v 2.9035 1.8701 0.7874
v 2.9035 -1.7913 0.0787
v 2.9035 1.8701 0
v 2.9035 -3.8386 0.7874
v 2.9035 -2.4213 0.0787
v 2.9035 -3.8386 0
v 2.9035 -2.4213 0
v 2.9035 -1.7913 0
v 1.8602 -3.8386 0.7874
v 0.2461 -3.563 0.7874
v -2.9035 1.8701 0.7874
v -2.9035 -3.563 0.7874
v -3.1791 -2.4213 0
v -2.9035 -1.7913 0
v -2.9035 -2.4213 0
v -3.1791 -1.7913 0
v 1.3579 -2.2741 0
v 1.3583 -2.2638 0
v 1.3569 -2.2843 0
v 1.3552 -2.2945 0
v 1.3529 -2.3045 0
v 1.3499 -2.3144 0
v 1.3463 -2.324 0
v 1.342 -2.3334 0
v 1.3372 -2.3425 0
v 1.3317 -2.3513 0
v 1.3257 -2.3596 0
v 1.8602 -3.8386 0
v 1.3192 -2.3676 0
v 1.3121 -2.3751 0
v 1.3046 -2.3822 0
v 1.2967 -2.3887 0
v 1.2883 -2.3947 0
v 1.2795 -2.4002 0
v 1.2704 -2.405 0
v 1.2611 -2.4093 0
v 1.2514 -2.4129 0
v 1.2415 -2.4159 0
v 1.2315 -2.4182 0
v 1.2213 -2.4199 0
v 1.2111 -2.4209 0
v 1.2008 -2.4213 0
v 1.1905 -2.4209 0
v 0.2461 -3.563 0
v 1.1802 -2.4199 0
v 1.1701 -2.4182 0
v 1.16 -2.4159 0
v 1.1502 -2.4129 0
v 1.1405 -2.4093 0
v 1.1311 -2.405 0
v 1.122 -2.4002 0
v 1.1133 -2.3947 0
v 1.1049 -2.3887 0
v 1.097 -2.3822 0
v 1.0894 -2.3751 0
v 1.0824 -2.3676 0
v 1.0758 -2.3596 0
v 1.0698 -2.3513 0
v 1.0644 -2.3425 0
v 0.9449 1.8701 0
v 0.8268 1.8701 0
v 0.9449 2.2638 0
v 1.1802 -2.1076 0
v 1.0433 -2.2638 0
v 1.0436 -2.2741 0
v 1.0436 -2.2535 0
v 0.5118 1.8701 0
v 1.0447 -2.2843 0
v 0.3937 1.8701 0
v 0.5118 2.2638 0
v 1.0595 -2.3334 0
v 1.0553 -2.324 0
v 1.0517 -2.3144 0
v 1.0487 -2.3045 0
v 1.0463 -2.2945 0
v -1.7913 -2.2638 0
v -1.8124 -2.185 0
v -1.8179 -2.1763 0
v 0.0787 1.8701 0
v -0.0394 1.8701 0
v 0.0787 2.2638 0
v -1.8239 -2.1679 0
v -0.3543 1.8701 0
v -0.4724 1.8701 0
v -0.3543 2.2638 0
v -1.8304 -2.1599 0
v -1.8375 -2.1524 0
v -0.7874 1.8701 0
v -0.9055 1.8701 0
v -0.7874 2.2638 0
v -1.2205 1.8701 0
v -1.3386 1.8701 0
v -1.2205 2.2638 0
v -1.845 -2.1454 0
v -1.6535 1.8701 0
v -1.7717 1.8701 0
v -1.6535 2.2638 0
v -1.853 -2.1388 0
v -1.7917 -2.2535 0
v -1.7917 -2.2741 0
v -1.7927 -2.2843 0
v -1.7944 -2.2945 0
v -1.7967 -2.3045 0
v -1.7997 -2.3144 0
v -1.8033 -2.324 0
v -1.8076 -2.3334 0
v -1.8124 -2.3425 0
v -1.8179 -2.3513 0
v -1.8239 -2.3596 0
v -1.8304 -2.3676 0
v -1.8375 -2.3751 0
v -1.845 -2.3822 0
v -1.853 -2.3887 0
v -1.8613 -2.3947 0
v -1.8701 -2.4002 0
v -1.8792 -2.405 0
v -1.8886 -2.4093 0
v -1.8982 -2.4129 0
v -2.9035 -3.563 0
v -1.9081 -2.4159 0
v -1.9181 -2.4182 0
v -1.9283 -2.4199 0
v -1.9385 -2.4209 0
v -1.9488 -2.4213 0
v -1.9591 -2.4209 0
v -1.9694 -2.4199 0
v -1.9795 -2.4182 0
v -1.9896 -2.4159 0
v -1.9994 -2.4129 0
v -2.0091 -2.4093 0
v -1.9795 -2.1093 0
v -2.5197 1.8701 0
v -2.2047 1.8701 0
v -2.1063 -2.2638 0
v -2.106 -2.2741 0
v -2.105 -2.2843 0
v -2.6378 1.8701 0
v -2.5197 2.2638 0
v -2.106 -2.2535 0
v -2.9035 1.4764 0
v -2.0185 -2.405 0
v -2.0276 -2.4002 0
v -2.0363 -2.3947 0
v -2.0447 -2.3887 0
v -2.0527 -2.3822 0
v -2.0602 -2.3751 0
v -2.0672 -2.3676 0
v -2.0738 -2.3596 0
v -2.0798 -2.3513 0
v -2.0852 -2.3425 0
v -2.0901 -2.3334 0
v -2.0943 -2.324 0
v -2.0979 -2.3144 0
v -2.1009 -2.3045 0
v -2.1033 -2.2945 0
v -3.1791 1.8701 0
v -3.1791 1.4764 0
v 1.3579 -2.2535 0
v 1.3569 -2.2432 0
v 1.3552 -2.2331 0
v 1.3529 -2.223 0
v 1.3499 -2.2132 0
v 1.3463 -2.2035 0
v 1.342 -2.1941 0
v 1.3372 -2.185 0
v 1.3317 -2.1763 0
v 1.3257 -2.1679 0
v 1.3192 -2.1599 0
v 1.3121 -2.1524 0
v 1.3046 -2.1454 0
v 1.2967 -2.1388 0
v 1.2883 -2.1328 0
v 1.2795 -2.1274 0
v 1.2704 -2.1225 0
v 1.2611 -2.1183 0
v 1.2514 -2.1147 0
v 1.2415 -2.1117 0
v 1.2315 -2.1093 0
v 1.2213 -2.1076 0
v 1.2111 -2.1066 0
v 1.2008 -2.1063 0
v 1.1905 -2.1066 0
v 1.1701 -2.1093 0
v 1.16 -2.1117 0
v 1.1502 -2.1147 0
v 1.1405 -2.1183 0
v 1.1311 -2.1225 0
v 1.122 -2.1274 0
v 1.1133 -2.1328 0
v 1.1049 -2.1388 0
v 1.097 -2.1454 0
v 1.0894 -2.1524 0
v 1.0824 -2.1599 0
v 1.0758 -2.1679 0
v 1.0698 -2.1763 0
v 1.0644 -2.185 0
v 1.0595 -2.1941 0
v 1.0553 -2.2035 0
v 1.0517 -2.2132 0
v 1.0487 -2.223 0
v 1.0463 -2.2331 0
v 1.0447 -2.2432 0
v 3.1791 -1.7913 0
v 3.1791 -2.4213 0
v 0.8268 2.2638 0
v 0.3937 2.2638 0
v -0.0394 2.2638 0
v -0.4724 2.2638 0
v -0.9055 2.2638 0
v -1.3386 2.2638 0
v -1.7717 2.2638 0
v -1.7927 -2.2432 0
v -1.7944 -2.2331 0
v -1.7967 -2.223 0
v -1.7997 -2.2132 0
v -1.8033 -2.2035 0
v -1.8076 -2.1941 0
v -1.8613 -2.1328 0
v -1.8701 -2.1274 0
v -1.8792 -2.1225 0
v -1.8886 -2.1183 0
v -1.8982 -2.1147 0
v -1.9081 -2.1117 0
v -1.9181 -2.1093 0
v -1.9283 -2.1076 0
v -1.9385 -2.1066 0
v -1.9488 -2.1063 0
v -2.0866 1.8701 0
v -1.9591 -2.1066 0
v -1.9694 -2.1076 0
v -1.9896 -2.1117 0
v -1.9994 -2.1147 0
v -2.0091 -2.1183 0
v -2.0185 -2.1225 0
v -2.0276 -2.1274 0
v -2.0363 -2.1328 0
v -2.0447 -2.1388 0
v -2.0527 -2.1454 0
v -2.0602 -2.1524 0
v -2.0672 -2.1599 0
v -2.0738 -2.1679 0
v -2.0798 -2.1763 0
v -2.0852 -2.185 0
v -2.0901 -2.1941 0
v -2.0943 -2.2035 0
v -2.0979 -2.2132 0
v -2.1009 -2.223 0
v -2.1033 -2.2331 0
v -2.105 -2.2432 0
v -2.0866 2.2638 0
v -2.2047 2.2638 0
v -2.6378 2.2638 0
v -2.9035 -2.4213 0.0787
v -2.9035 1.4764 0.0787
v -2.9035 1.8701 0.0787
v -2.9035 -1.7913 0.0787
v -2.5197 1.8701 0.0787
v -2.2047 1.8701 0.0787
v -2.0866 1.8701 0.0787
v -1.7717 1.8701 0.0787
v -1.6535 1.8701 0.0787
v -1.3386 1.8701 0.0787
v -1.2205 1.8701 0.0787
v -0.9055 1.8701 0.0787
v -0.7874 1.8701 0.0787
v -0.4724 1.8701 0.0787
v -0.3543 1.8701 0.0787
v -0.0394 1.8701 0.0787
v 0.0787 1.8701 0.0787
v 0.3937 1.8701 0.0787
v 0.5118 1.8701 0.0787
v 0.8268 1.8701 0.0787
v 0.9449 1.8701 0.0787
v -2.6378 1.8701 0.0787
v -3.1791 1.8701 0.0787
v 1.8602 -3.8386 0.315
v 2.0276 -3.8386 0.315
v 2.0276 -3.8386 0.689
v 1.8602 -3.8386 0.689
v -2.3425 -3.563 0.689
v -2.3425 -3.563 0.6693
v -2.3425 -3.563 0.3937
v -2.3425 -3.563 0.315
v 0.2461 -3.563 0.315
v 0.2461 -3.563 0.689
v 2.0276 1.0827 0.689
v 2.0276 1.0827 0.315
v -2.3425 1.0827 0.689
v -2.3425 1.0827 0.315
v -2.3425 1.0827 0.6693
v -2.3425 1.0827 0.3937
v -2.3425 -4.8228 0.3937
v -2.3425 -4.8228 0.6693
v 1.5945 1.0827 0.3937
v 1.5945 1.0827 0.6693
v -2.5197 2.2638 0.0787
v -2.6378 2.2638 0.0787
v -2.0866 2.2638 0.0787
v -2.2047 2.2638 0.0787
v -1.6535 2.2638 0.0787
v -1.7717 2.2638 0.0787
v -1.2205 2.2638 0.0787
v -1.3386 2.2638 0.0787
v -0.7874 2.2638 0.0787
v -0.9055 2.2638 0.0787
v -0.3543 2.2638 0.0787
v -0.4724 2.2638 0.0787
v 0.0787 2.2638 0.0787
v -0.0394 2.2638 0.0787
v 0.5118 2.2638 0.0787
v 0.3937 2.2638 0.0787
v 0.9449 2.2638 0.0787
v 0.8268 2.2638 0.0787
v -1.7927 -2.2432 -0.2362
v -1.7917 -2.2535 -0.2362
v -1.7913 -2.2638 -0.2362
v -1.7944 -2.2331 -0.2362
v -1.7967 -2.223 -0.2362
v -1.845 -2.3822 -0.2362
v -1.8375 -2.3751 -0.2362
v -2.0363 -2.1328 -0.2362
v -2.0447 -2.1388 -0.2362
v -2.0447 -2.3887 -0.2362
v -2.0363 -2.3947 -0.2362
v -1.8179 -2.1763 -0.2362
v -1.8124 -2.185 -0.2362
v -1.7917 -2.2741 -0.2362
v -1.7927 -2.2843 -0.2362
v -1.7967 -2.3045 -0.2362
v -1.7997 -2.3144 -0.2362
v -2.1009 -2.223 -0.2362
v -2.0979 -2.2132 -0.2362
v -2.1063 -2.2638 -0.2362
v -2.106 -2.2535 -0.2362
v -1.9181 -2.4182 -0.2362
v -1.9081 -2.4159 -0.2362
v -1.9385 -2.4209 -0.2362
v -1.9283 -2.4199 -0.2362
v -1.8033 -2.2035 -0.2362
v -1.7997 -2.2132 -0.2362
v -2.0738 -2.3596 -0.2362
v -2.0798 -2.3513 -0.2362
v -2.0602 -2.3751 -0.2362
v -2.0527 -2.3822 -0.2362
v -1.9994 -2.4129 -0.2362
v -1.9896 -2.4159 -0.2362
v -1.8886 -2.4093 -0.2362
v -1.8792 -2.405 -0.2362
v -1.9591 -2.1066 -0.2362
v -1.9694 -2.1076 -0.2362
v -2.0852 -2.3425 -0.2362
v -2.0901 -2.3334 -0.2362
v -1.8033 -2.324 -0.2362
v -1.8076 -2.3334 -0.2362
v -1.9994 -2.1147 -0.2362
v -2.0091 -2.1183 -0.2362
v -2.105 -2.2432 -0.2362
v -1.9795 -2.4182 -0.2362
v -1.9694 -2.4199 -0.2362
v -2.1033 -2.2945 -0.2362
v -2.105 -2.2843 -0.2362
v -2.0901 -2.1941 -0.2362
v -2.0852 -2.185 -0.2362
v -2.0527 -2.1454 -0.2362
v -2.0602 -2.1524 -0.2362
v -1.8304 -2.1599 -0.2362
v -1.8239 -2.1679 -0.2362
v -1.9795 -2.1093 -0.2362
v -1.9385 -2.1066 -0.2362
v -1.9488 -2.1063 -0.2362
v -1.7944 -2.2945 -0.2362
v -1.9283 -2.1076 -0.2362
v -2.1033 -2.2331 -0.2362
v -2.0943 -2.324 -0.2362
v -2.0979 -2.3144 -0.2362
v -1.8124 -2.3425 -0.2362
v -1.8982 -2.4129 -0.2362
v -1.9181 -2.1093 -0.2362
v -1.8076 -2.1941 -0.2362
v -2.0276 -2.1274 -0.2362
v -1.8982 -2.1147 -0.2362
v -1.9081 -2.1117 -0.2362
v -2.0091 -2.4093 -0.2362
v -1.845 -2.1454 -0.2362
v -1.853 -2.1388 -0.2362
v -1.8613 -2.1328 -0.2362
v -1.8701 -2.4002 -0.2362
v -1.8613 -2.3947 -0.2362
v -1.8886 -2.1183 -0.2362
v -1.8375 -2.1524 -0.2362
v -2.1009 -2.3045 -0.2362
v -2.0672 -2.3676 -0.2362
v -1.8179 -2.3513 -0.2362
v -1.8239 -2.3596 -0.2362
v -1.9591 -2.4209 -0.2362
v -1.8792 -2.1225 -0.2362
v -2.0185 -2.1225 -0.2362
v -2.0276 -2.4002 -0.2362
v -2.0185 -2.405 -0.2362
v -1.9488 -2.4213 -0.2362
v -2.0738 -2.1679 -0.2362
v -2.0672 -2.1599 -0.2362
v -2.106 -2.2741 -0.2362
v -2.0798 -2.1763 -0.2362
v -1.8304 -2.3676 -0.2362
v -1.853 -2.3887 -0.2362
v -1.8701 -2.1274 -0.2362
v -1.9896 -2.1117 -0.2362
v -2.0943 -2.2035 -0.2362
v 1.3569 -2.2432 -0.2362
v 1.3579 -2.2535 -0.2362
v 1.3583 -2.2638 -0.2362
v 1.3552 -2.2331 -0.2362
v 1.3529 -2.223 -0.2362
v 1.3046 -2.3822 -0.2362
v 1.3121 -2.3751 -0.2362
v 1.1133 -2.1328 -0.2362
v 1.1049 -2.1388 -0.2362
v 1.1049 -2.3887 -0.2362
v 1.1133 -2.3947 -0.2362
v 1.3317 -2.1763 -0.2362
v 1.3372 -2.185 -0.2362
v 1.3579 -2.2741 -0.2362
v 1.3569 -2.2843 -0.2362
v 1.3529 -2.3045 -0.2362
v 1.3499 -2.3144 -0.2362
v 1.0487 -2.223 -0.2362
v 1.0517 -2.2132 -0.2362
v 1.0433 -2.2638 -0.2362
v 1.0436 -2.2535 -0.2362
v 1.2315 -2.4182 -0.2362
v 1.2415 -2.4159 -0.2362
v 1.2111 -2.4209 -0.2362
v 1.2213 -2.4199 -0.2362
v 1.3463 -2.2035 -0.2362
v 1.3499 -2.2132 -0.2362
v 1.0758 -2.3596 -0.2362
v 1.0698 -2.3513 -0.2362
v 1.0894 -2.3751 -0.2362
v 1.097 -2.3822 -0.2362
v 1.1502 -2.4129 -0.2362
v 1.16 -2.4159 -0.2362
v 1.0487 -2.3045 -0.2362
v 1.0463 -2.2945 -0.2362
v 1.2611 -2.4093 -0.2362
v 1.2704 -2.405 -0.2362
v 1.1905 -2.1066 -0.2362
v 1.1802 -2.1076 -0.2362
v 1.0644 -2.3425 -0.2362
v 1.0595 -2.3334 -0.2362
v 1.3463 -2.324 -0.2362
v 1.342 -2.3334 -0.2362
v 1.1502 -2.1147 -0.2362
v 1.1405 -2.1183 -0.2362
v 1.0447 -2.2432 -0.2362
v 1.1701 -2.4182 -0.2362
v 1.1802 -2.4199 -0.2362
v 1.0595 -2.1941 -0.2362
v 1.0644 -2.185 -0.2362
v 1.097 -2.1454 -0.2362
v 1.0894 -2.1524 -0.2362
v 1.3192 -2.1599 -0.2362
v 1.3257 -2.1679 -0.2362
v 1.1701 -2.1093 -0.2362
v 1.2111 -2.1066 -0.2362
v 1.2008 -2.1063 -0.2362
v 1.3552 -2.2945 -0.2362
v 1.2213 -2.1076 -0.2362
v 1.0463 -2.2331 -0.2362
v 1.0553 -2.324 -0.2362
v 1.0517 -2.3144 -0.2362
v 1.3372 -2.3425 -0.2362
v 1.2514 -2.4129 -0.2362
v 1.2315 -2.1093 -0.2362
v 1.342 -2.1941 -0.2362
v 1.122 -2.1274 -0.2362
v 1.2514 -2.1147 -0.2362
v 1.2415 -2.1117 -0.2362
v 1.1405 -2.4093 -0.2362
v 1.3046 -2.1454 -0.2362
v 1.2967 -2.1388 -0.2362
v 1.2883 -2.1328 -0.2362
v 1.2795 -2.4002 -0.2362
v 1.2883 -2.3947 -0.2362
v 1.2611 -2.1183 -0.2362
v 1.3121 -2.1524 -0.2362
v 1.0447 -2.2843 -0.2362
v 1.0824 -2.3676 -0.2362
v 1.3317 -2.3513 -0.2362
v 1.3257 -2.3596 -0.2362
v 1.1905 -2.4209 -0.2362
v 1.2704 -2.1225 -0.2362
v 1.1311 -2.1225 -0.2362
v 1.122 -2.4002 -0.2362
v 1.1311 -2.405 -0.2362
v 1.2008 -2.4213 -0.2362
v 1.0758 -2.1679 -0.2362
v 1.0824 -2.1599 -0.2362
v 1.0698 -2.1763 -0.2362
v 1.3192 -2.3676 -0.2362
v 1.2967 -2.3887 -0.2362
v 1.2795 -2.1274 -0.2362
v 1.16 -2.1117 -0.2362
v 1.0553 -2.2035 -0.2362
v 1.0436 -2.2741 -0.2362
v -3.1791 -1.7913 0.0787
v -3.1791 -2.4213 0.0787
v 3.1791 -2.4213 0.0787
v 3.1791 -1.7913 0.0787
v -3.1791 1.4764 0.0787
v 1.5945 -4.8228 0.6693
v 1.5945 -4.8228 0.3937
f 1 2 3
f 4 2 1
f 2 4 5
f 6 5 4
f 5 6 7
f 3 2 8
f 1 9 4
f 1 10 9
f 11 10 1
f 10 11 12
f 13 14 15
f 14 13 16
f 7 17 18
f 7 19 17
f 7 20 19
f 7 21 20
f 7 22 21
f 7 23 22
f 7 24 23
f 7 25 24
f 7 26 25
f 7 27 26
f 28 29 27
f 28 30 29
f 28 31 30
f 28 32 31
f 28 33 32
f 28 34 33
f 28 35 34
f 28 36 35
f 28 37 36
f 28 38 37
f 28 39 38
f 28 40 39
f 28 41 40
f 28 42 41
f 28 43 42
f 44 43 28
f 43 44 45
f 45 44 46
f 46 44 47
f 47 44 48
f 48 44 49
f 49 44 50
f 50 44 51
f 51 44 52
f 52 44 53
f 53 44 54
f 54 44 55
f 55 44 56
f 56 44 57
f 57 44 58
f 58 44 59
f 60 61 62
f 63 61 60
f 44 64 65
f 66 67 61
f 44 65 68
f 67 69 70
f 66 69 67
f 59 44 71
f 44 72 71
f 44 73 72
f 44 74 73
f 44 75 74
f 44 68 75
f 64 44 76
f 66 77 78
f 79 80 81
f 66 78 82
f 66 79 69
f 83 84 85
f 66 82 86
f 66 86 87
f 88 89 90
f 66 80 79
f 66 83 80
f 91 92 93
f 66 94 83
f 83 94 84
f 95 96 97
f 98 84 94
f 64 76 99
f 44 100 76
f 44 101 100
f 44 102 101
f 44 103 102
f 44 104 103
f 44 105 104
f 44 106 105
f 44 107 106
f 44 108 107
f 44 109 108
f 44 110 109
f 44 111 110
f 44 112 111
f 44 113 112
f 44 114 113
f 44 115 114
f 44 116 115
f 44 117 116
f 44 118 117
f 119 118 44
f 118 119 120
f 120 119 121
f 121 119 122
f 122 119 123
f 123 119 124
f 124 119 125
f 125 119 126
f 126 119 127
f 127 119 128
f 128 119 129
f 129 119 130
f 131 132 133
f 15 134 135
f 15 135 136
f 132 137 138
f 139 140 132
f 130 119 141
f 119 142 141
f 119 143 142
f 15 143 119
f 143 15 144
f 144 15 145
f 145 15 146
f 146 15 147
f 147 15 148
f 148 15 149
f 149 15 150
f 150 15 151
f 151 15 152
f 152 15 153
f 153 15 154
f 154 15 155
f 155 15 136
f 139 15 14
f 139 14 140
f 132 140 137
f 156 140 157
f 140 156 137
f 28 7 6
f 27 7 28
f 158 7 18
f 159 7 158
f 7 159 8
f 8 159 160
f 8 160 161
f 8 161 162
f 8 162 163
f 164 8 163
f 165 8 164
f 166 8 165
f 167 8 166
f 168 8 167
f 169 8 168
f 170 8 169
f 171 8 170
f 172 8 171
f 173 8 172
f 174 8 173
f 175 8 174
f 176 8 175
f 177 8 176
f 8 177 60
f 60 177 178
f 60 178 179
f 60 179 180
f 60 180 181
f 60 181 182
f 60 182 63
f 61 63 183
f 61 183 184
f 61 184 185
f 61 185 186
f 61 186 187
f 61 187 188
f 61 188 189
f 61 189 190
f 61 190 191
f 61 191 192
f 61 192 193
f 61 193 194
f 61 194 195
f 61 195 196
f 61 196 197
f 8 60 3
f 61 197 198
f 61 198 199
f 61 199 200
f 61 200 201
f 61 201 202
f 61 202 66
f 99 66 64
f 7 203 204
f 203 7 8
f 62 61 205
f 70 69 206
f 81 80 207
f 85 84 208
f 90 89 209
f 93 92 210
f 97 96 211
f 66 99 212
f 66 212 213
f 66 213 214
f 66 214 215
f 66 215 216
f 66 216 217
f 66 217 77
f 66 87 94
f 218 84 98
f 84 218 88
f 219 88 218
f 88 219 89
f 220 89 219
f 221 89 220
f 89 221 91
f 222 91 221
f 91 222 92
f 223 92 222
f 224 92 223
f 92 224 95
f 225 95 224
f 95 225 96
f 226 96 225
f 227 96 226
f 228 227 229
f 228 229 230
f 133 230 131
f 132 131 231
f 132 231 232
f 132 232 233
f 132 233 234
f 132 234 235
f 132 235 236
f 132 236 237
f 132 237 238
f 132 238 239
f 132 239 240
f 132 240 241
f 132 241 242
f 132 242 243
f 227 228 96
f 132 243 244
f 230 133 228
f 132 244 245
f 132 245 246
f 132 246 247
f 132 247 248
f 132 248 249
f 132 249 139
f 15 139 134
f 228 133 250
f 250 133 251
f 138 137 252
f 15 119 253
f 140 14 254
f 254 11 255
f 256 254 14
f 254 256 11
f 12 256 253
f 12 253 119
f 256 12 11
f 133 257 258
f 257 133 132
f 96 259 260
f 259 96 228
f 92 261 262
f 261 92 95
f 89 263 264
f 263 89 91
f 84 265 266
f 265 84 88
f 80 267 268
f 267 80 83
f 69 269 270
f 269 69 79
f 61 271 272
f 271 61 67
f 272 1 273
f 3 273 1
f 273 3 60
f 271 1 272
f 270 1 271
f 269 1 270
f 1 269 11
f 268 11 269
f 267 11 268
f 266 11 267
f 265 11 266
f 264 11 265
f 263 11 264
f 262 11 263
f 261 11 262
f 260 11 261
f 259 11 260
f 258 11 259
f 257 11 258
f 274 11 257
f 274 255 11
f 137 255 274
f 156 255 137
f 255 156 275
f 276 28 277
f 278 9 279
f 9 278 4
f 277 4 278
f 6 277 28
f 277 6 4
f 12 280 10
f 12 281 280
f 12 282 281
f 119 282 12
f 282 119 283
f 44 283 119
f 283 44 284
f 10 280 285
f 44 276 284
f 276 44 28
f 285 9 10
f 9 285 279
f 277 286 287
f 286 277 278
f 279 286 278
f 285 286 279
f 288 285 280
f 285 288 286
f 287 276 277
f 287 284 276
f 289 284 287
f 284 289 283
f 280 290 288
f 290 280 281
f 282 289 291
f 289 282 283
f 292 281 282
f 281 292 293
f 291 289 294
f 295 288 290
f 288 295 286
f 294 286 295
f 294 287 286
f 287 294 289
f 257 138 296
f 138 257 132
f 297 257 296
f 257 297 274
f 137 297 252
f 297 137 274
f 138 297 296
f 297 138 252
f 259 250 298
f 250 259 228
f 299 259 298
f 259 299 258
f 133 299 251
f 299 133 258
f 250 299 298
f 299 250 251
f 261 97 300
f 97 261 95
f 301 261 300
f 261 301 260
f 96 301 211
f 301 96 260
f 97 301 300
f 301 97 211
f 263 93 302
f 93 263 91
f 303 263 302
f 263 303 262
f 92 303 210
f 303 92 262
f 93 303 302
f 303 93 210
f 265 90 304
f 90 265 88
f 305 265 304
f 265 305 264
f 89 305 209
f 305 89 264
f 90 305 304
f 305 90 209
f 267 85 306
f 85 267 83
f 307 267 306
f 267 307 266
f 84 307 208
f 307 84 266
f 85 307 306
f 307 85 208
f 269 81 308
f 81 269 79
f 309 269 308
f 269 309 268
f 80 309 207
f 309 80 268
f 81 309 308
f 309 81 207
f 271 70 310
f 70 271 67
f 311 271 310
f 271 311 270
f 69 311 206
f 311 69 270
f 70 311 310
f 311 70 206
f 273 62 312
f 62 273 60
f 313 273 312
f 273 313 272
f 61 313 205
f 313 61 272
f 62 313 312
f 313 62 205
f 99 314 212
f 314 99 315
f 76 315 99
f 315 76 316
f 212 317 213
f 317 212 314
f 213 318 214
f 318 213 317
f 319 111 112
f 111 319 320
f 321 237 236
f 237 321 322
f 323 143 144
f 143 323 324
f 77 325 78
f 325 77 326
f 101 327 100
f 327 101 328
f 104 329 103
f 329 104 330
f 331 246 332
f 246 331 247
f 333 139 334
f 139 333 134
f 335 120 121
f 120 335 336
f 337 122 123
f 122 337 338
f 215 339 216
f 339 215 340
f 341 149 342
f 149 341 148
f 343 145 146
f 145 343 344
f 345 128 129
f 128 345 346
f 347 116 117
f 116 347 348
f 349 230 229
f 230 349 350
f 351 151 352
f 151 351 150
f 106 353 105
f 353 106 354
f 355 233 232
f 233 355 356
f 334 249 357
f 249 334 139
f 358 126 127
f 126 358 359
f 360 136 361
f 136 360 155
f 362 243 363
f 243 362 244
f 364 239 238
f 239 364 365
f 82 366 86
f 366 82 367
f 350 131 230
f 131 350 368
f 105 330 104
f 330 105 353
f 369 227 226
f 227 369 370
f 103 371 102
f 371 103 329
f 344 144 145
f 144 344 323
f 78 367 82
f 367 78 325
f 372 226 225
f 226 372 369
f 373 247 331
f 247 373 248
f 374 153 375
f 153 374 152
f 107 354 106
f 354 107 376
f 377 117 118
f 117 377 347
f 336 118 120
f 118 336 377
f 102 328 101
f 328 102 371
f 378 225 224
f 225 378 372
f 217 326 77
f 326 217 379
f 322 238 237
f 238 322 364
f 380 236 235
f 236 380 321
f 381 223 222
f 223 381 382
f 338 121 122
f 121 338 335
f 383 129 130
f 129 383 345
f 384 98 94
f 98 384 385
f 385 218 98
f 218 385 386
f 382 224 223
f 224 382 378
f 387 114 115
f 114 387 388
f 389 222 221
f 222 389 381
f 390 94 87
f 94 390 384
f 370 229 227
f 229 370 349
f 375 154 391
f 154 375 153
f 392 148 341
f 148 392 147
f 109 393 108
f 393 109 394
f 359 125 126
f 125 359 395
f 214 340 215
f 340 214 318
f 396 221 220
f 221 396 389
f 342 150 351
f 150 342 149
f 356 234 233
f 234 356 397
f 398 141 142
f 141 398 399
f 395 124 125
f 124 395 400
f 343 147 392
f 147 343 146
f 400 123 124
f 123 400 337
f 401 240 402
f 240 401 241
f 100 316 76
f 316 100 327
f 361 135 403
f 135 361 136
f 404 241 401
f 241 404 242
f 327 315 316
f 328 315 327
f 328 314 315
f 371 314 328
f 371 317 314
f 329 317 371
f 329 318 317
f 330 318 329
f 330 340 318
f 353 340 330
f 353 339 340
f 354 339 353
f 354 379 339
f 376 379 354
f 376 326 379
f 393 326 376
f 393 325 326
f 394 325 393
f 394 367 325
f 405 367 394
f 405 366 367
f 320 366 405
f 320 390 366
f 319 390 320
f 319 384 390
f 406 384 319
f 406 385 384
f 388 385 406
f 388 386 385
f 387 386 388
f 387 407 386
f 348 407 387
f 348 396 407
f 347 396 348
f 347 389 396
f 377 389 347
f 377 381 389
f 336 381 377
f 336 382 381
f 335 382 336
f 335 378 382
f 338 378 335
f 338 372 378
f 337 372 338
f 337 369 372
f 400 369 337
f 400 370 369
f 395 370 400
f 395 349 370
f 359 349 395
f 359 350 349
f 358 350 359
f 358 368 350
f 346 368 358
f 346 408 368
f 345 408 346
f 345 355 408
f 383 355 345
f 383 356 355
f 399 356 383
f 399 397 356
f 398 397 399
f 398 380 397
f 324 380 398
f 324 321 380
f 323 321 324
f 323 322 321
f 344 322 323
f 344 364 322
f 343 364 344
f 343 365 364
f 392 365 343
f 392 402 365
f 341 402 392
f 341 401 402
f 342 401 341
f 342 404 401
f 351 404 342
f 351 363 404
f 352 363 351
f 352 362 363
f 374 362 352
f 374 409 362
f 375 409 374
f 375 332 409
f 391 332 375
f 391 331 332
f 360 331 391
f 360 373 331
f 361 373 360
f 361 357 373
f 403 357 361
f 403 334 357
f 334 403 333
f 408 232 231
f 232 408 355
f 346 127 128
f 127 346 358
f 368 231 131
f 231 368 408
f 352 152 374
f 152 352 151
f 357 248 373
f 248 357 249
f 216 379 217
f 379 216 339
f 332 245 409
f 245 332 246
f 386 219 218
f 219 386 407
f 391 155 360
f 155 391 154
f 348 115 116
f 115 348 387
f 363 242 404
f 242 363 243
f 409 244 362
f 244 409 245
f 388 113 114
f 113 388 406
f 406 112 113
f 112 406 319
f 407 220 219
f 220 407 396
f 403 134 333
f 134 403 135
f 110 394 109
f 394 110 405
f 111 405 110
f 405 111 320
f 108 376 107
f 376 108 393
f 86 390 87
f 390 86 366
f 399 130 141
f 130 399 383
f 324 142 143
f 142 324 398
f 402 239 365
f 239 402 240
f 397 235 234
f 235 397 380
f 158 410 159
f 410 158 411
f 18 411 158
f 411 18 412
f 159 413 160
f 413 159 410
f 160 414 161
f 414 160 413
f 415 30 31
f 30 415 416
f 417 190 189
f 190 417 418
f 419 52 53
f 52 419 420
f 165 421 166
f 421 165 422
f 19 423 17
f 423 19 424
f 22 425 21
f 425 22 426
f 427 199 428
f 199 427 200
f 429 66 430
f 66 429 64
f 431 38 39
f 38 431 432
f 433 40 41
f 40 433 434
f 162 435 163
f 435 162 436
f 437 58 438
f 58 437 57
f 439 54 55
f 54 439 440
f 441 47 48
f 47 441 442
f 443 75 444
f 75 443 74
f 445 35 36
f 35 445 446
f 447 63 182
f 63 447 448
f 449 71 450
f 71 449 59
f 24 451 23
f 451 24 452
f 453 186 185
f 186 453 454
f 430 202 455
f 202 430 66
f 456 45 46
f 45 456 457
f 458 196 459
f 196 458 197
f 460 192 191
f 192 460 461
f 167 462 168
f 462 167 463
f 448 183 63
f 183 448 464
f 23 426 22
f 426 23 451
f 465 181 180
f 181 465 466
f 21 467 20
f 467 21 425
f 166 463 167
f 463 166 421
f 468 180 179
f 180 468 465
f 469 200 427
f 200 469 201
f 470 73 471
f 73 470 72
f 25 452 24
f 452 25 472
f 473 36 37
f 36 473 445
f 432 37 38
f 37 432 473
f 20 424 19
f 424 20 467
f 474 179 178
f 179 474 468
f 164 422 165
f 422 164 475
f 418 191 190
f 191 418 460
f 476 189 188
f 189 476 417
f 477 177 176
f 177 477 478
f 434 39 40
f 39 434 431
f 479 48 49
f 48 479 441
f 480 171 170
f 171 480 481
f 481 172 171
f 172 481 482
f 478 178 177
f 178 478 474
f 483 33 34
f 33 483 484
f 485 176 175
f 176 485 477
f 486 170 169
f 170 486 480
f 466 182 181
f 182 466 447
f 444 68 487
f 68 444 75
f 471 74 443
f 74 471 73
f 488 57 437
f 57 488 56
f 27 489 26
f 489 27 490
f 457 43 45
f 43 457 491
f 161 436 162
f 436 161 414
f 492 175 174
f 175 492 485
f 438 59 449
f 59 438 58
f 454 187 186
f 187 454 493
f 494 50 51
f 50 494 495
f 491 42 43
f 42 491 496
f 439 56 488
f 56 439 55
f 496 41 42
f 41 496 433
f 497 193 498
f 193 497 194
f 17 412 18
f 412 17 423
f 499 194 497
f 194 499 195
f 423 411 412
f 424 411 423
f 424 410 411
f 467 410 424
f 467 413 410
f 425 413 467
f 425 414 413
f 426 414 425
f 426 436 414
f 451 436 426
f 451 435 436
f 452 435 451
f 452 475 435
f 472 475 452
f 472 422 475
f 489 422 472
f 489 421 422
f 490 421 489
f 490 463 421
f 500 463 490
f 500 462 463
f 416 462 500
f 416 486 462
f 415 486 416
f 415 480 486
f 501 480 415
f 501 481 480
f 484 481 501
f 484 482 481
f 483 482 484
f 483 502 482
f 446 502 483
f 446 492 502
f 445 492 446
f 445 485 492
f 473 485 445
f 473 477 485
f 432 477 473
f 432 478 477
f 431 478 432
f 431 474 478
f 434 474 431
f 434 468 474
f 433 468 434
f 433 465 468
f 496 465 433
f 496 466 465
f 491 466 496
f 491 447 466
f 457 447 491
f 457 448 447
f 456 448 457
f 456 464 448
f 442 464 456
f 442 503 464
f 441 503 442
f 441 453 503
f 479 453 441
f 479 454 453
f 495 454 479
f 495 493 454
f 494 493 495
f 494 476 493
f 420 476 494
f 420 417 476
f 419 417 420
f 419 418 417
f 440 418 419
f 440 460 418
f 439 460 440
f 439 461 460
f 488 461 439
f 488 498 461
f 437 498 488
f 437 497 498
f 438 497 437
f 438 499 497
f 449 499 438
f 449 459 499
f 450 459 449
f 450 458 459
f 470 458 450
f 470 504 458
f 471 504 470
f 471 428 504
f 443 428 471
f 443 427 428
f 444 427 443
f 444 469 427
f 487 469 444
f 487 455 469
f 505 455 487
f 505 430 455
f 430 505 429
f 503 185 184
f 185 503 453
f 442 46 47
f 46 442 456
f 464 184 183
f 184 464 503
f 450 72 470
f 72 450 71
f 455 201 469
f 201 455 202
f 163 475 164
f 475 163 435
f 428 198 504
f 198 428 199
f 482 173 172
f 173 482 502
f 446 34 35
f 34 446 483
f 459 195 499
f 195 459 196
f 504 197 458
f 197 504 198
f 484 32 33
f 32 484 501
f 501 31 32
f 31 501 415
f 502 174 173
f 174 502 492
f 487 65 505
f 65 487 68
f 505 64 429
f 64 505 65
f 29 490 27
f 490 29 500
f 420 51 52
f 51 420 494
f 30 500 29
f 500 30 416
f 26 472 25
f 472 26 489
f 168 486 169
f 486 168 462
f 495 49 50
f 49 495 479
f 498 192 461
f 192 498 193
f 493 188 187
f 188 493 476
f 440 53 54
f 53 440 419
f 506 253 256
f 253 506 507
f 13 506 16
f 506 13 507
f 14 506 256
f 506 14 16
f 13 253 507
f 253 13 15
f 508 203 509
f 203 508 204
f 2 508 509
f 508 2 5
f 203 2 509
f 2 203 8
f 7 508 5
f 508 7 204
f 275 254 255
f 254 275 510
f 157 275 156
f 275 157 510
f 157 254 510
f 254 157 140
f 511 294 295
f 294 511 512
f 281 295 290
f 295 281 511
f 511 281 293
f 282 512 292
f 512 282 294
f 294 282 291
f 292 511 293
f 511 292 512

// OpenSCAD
// TF-Push

$fn=96;
scale(1/2.54)
{
difference()
{
    translate([-7.375,-9.75,0])cube([14.75,14.50,2]);
    translate([-7.375,-9.75,0])hull()
    {
        cube([8,0.7,2]);
        translate([11.1,-1,0])cube([1,1,2]);
    }
    translate([-5.95,-12.25,.8])cube([11.1,15,0.95]);
}
translate([-4.95,-5.75,-0.6])cylinder(d=0.8,h=1);
translate([3.05,-5.75,-0.6])cylinder(d=0.8,h=1);
translate([-8.075,-5.35-1.6/2,0])cube([0.7,1.6,0.2]);
translate([7.375,-5.35-1.6/2,0])cube([0.7,1.6,0.2]);
translate([-8.075,4.25-1/2,0])cube([0.7,1,0.2]);
translate([-5.95,-12.25,1])cube([10,15,0.7]);
for(x=[0:8])translate([-6.55-0.3/2+x*1.1,5.25-1/2,0])cube([0.3,1,0.2]);
}
